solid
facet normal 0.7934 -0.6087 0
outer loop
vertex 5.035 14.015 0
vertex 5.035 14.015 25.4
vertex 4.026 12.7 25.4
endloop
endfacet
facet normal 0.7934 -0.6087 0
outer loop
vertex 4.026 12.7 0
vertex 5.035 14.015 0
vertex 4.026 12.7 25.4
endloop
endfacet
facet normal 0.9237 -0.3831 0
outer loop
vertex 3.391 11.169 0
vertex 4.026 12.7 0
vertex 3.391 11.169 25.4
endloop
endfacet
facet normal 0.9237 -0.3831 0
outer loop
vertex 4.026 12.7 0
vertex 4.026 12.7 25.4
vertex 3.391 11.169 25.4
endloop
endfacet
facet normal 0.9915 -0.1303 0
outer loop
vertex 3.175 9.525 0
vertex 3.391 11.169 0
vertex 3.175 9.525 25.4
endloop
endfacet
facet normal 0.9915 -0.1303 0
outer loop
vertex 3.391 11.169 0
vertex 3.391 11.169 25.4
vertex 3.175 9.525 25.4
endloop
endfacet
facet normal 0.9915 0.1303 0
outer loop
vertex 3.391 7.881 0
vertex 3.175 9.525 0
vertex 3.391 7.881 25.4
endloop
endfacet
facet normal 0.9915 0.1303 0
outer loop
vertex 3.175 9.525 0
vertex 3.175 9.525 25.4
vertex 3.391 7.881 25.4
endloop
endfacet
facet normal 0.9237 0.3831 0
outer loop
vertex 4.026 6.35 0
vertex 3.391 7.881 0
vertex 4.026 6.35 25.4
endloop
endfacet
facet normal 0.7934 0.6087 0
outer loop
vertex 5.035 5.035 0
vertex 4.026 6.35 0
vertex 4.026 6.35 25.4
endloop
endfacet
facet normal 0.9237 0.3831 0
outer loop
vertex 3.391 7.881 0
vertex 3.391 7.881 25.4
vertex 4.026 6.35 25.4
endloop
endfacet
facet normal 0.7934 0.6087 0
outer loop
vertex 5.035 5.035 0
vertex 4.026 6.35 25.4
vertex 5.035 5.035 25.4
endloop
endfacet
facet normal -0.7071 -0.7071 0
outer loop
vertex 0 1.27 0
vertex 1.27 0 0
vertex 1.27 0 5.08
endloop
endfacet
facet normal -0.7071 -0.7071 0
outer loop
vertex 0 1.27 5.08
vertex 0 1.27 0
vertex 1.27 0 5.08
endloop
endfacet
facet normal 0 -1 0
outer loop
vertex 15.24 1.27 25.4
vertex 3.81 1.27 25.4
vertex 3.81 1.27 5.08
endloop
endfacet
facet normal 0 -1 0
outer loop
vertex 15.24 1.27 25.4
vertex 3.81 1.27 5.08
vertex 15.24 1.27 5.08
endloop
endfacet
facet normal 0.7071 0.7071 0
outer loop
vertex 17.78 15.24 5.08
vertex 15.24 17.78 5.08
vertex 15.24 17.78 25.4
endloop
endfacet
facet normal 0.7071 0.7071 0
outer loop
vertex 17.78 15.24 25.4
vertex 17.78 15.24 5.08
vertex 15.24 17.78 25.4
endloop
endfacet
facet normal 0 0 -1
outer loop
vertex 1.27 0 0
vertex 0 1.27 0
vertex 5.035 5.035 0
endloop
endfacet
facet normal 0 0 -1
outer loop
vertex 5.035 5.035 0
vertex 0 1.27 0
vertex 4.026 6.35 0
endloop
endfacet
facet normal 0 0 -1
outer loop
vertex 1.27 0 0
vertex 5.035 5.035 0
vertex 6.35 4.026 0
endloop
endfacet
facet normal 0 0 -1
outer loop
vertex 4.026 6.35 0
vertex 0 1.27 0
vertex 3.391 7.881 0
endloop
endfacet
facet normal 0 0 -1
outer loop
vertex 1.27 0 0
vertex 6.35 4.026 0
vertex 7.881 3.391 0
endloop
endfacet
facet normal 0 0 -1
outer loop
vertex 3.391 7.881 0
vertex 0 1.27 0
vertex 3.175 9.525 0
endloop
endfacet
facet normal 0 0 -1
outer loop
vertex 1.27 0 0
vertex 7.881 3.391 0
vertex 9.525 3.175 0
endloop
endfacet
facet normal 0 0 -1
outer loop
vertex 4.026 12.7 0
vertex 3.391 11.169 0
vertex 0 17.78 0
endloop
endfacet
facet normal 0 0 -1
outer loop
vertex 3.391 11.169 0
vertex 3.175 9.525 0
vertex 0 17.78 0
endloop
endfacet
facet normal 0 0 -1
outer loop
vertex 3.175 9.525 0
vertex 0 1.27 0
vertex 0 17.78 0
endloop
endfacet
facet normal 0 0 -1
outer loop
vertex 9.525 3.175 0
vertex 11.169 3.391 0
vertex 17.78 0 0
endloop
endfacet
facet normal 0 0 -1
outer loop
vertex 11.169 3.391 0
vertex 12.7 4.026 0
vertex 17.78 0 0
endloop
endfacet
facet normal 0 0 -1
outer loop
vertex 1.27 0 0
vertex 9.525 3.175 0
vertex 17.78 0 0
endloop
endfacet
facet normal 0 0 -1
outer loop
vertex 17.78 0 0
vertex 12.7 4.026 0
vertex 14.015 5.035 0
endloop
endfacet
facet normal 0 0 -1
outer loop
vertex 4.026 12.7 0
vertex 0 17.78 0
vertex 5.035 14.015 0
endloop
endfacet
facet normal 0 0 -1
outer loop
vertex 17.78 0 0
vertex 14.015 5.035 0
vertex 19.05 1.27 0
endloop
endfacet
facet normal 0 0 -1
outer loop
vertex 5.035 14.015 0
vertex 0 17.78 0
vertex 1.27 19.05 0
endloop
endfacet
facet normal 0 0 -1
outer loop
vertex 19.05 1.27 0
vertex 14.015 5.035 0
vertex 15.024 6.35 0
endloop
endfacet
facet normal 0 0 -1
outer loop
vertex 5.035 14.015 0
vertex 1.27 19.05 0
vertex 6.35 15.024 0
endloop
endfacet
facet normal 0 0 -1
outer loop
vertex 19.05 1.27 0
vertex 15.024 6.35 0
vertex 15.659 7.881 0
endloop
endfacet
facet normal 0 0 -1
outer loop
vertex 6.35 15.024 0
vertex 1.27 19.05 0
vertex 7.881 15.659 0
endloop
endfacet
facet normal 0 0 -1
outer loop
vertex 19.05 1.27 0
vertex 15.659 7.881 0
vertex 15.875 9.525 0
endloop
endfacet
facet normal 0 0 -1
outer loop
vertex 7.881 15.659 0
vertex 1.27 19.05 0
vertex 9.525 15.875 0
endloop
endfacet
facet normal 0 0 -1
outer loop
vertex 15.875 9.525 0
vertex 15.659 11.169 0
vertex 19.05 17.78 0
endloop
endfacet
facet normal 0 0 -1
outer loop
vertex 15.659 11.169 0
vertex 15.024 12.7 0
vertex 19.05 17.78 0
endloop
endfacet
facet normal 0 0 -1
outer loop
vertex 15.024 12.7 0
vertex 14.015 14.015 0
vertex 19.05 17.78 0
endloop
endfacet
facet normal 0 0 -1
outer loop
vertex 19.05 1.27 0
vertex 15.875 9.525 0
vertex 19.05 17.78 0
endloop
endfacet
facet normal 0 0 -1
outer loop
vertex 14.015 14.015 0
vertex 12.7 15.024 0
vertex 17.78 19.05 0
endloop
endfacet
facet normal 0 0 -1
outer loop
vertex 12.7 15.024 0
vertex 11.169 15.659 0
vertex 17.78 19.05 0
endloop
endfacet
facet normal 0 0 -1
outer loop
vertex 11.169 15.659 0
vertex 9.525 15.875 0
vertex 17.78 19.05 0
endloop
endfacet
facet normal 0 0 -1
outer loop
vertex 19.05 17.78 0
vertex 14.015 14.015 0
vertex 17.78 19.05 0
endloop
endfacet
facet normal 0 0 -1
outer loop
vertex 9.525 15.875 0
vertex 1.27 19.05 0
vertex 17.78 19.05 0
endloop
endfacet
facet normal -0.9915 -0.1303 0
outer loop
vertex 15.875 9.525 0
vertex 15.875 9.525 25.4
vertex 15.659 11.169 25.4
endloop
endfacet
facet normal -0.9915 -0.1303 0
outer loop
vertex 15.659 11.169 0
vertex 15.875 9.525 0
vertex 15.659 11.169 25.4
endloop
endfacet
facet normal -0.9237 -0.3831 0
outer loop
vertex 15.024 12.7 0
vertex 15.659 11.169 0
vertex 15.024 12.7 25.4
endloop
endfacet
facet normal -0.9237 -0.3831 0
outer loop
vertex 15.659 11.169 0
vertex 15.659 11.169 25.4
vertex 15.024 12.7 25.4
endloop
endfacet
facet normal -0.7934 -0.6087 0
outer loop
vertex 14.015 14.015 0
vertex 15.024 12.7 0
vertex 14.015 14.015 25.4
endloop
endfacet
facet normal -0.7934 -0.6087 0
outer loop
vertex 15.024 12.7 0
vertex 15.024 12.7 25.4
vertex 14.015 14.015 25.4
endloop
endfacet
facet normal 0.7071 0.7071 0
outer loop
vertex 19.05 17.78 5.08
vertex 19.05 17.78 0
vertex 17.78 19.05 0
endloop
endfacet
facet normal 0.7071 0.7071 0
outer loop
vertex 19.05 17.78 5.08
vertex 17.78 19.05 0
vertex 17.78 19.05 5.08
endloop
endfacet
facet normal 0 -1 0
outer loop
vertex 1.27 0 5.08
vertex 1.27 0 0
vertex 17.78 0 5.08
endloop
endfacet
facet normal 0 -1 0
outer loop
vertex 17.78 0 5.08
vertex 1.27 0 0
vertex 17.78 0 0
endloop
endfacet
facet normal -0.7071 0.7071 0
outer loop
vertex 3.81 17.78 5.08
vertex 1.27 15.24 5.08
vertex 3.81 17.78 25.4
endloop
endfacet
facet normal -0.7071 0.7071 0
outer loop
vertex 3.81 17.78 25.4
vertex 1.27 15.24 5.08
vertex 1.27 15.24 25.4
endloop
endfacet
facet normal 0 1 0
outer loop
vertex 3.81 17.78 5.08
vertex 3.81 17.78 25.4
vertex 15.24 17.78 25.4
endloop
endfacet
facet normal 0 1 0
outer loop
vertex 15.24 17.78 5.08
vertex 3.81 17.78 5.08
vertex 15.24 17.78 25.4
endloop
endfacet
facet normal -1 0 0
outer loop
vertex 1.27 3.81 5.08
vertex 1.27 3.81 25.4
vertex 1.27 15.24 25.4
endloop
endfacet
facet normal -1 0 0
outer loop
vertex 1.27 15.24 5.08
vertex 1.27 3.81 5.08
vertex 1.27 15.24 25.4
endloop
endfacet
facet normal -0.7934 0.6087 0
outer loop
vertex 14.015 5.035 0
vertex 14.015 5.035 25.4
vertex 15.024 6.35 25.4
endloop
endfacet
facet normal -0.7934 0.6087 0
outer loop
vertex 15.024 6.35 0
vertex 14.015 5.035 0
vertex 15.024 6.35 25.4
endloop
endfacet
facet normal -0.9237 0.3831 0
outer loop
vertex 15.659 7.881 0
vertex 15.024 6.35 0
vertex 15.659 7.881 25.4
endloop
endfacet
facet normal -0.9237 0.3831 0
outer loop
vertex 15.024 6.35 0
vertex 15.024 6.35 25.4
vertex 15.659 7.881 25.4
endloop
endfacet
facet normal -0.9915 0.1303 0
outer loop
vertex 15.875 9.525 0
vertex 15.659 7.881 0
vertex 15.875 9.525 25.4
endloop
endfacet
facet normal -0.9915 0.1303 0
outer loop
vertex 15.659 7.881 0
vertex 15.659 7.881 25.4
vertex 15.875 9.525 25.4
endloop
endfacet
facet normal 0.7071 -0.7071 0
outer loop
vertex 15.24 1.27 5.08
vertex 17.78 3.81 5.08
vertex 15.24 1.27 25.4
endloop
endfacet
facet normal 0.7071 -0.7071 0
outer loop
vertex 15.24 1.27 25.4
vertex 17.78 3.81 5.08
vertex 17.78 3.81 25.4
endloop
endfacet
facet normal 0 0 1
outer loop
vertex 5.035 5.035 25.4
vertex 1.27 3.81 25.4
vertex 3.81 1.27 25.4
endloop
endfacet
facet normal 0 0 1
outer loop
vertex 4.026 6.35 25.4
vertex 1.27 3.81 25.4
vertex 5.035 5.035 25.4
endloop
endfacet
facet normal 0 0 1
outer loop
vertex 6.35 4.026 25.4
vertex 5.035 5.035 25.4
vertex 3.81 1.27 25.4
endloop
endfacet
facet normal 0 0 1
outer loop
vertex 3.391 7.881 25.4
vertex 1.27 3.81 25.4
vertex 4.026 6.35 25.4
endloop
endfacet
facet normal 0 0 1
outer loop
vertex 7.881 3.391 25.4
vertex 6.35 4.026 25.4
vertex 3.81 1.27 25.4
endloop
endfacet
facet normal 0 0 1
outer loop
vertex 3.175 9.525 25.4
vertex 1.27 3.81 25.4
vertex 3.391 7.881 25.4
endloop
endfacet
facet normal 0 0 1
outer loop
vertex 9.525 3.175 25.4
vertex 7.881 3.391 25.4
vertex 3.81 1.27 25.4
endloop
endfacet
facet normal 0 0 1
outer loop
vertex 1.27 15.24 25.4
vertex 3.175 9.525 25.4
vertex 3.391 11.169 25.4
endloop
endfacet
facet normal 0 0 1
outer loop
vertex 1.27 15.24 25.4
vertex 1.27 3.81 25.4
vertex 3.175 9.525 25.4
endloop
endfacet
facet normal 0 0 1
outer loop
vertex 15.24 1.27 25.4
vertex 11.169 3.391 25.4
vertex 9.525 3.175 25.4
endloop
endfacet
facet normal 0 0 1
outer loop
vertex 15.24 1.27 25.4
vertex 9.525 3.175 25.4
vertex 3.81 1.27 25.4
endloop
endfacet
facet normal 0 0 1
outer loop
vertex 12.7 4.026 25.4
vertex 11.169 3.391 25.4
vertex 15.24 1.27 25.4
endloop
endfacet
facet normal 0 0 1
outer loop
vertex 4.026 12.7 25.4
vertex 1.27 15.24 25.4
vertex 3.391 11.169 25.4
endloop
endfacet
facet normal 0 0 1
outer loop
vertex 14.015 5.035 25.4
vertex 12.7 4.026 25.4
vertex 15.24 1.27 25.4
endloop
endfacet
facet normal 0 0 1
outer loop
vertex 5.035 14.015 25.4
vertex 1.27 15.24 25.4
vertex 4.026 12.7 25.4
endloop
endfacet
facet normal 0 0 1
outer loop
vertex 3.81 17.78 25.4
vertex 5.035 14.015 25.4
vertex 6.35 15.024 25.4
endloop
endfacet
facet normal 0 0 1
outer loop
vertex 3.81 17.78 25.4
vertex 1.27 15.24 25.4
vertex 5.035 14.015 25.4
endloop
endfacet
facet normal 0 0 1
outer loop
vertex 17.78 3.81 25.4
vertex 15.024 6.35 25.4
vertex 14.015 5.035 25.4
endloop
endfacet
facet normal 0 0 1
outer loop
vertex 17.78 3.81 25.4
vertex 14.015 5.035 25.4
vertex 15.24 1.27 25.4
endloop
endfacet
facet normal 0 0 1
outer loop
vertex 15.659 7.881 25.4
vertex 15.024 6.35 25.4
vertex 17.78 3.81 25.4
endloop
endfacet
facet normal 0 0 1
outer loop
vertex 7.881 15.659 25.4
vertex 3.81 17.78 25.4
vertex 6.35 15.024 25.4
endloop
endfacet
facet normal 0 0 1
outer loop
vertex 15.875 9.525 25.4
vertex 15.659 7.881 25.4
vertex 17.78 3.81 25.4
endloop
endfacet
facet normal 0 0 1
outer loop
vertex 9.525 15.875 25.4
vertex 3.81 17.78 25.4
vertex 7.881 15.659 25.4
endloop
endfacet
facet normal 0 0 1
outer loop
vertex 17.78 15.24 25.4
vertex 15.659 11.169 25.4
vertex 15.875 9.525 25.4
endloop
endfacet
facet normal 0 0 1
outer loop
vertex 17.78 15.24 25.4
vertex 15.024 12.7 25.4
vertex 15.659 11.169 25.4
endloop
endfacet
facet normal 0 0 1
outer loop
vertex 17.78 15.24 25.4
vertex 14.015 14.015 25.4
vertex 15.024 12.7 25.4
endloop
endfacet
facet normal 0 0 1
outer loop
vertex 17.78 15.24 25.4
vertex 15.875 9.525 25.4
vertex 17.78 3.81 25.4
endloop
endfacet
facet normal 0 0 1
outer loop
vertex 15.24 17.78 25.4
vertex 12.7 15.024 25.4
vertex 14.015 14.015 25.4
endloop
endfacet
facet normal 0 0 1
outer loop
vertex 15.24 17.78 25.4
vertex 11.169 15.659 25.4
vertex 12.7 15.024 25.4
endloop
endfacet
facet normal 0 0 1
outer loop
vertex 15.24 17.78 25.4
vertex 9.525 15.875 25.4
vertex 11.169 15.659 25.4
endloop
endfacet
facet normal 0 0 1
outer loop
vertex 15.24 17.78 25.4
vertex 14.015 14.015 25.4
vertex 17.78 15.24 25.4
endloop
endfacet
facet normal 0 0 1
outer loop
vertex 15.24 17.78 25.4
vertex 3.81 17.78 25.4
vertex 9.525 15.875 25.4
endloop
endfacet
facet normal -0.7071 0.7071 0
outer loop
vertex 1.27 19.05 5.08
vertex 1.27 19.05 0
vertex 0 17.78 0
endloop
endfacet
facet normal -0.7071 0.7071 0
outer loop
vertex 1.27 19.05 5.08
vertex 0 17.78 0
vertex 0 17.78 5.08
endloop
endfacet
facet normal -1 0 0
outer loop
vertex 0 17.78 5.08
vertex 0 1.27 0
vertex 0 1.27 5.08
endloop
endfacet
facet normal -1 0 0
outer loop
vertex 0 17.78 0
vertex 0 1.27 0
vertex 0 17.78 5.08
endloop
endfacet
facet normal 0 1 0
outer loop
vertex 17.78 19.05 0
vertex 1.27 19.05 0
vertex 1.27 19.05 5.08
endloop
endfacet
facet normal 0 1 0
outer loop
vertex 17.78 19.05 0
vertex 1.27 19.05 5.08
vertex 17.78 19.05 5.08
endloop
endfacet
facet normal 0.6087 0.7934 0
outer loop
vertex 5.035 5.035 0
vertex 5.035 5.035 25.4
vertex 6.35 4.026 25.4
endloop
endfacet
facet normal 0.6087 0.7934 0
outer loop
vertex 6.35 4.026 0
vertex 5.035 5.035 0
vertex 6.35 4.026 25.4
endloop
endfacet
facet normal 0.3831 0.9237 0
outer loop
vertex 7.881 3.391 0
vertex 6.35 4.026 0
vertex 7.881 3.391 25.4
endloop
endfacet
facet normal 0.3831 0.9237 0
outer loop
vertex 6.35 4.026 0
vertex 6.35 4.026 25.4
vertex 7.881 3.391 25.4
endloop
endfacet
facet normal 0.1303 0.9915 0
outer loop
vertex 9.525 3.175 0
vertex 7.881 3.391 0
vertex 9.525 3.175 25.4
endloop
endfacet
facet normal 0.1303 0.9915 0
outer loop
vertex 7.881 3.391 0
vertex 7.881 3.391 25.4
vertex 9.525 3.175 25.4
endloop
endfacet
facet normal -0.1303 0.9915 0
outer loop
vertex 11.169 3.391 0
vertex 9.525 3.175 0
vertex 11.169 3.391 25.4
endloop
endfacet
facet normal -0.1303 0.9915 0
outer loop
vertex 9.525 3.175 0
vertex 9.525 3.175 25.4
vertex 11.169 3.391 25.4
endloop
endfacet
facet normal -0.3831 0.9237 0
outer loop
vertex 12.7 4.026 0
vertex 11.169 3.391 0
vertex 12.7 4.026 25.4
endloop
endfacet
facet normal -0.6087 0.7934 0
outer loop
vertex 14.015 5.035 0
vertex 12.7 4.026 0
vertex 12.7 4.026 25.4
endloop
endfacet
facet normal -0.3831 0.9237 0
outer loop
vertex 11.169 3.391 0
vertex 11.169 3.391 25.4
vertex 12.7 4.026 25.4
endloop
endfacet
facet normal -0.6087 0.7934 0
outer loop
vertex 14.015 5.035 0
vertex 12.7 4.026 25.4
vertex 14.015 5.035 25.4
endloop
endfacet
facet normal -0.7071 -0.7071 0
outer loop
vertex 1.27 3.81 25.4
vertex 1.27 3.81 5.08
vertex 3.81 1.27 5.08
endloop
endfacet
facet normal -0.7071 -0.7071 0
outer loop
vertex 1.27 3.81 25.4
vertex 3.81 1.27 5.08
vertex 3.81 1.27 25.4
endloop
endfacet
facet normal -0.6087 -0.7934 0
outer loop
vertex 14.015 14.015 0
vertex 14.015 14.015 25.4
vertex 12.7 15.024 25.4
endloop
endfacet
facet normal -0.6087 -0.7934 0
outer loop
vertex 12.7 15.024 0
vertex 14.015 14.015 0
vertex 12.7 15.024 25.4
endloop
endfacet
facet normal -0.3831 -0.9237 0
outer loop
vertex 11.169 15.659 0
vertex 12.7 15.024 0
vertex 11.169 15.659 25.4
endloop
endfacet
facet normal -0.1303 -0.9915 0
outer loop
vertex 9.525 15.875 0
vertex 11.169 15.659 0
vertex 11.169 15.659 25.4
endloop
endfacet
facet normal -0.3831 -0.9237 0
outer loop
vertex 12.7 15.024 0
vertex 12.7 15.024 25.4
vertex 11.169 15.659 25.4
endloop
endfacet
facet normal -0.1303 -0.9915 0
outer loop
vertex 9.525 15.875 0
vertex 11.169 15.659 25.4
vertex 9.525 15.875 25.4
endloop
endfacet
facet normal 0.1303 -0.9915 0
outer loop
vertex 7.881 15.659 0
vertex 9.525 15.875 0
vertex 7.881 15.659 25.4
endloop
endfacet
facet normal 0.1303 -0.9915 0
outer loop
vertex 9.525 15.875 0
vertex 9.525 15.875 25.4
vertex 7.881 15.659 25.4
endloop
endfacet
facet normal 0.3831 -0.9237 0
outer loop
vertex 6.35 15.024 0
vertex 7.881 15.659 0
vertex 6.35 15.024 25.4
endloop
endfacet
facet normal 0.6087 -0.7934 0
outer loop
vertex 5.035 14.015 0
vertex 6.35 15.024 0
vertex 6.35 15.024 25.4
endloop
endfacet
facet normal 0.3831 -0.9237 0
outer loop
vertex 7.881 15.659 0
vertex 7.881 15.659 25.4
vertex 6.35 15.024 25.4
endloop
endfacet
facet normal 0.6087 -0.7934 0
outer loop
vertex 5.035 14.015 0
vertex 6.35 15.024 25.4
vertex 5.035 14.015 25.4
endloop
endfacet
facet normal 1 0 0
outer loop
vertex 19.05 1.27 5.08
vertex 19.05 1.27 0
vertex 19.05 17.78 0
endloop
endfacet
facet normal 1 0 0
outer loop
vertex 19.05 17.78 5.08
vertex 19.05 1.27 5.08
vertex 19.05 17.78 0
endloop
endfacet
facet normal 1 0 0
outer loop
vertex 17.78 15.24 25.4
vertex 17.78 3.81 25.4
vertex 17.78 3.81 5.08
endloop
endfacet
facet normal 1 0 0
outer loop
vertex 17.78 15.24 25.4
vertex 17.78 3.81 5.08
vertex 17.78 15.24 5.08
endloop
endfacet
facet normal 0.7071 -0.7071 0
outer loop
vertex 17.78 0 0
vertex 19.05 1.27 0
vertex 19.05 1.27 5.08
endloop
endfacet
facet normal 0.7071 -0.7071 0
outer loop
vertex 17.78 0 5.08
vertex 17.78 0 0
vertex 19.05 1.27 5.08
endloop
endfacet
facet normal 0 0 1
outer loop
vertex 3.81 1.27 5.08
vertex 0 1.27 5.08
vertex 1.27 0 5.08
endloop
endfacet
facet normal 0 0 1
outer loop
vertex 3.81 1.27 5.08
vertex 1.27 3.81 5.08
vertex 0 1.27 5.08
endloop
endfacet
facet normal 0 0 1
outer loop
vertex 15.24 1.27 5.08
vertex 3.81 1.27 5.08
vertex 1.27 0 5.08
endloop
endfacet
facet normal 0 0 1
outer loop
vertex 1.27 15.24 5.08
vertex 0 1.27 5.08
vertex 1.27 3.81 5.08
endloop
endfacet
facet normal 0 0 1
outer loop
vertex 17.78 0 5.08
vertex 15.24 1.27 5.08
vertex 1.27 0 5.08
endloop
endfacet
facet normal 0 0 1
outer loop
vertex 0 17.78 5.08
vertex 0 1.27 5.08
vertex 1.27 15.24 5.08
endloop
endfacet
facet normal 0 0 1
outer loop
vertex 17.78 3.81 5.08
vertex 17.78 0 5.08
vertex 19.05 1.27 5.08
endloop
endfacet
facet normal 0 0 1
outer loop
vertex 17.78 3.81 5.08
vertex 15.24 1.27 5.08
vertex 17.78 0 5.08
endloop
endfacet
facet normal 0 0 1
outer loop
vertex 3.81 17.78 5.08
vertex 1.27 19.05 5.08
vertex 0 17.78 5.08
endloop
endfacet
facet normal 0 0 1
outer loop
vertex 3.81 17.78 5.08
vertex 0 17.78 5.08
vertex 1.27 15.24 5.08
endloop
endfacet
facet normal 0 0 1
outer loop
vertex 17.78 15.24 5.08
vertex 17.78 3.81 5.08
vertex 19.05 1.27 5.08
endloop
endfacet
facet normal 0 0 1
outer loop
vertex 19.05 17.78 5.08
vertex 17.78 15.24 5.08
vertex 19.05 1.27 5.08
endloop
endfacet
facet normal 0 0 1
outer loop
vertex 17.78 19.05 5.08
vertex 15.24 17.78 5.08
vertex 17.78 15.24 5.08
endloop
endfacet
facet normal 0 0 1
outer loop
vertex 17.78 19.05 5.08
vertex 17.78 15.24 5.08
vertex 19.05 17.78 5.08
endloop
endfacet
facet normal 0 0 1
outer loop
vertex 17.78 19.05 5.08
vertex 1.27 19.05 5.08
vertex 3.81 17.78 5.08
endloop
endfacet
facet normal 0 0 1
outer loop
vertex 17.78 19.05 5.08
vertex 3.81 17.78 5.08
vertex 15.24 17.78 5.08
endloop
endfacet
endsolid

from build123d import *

# Parameters (mm, degrees)
F0_W     = 19.05
F0_H     = 19.05
F1_DEPTH = 5.08
F2_W     = 16.51
F2_H     = 16.51
F3_DEPTH = 20.32
F5_DEPTH = 25.4
F6_SIZE  = 2.54
F7_SIZE  = 1.27


with BuildPart() as f1:
    # F0 (on Top) → F1 (new body)
    with BuildSketch(Plane.XY):
        with Locations((9.525, 9.525)):
            Rectangle(F0_W, F0_H)
    extrude(amount=F1_DEPTH)

    # F2 (on face) → F3 (join)
    with BuildSketch(Plane.XY.offset(5.08)):
        with Locations((9.525, 9.525)):
            Rectangle(F2_W, F2_H)
    extrude(amount=F3_DEPTH)

    # F4 (on face) → F5 (cut)
    with BuildSketch(Plane.XY.offset(25.4)):
        with BuildLine():
            Line((5.0348719395, 5.0348719395), (9.525, 9.525))
            Line((9.525, 9.525), (5.0348719395, 14.0151280605))
            ThreePointArc((5.0348719395, 14.0151280605), (3.175, 9.525), (5.0348719395, 5.0348719395))
        make_face()
        with BuildLine():
            Line((5.0348719395, 14.0151280605), (9.525, 9.525))
            Line((9.525, 9.525), (14.0151280605, 14.0151280605))
            ThreePointArc((14.0151280605, 14.0151280605), (9.525, 15.875), (5.0348719395, 14.0151280605))
        make_face()
        with BuildLine():
            Line((9.525, 9.525), (14.0151280605, 5.0348719395))
            ThreePointArc((14.0151280605, 5.0348719395), (15.3916350314, 7.0949602045), (15.875, 9.525))
            ThreePointArc((15.875, 9.525), (15.3916350314, 11.9550397955), (14.0151280605, 14.0151280605))
            Line((14.0151280605, 14.0151280605), (9.525, 9.525))
        make_face()
        with BuildLine():
            ThreePointArc((5.0348719395, 5.0348719395), (9.525, 3.175), (14.0151280605, 5.0348719395))
            Line((14.0151280605, 5.0348719395), (9.525, 9.525))
            Line((9.525, 9.525), (5.0348719395, 5.0348719395))
        make_face()
    extrude(amount=-F5_DEPTH, mode=Mode.SUBTRACT)

    # F6
    f6_edges = [f1.edges().sort_by_distance(p)[0] for p in [
        (17.78, 17.78, 15.24),
        (1.27, 17.78, 15.24),
        (1.27, 1.27, 15.24),
        (17.78, 1.27, 15.24),
    ]]
    chamfer(f6_edges, length=F6_SIZE)

    # F7
    f7_edges = [f1.edges().sort_by_distance(p)[0] for p in [
        (0, 0, 2.54),
        (0, 19.05, 2.54),
        (19.05, 19.05, 2.54),
        (19.05, 0, 2.54),
    ]]
    chamfer(f7_edges, length=F7_SIZE)


solid = f1.part
